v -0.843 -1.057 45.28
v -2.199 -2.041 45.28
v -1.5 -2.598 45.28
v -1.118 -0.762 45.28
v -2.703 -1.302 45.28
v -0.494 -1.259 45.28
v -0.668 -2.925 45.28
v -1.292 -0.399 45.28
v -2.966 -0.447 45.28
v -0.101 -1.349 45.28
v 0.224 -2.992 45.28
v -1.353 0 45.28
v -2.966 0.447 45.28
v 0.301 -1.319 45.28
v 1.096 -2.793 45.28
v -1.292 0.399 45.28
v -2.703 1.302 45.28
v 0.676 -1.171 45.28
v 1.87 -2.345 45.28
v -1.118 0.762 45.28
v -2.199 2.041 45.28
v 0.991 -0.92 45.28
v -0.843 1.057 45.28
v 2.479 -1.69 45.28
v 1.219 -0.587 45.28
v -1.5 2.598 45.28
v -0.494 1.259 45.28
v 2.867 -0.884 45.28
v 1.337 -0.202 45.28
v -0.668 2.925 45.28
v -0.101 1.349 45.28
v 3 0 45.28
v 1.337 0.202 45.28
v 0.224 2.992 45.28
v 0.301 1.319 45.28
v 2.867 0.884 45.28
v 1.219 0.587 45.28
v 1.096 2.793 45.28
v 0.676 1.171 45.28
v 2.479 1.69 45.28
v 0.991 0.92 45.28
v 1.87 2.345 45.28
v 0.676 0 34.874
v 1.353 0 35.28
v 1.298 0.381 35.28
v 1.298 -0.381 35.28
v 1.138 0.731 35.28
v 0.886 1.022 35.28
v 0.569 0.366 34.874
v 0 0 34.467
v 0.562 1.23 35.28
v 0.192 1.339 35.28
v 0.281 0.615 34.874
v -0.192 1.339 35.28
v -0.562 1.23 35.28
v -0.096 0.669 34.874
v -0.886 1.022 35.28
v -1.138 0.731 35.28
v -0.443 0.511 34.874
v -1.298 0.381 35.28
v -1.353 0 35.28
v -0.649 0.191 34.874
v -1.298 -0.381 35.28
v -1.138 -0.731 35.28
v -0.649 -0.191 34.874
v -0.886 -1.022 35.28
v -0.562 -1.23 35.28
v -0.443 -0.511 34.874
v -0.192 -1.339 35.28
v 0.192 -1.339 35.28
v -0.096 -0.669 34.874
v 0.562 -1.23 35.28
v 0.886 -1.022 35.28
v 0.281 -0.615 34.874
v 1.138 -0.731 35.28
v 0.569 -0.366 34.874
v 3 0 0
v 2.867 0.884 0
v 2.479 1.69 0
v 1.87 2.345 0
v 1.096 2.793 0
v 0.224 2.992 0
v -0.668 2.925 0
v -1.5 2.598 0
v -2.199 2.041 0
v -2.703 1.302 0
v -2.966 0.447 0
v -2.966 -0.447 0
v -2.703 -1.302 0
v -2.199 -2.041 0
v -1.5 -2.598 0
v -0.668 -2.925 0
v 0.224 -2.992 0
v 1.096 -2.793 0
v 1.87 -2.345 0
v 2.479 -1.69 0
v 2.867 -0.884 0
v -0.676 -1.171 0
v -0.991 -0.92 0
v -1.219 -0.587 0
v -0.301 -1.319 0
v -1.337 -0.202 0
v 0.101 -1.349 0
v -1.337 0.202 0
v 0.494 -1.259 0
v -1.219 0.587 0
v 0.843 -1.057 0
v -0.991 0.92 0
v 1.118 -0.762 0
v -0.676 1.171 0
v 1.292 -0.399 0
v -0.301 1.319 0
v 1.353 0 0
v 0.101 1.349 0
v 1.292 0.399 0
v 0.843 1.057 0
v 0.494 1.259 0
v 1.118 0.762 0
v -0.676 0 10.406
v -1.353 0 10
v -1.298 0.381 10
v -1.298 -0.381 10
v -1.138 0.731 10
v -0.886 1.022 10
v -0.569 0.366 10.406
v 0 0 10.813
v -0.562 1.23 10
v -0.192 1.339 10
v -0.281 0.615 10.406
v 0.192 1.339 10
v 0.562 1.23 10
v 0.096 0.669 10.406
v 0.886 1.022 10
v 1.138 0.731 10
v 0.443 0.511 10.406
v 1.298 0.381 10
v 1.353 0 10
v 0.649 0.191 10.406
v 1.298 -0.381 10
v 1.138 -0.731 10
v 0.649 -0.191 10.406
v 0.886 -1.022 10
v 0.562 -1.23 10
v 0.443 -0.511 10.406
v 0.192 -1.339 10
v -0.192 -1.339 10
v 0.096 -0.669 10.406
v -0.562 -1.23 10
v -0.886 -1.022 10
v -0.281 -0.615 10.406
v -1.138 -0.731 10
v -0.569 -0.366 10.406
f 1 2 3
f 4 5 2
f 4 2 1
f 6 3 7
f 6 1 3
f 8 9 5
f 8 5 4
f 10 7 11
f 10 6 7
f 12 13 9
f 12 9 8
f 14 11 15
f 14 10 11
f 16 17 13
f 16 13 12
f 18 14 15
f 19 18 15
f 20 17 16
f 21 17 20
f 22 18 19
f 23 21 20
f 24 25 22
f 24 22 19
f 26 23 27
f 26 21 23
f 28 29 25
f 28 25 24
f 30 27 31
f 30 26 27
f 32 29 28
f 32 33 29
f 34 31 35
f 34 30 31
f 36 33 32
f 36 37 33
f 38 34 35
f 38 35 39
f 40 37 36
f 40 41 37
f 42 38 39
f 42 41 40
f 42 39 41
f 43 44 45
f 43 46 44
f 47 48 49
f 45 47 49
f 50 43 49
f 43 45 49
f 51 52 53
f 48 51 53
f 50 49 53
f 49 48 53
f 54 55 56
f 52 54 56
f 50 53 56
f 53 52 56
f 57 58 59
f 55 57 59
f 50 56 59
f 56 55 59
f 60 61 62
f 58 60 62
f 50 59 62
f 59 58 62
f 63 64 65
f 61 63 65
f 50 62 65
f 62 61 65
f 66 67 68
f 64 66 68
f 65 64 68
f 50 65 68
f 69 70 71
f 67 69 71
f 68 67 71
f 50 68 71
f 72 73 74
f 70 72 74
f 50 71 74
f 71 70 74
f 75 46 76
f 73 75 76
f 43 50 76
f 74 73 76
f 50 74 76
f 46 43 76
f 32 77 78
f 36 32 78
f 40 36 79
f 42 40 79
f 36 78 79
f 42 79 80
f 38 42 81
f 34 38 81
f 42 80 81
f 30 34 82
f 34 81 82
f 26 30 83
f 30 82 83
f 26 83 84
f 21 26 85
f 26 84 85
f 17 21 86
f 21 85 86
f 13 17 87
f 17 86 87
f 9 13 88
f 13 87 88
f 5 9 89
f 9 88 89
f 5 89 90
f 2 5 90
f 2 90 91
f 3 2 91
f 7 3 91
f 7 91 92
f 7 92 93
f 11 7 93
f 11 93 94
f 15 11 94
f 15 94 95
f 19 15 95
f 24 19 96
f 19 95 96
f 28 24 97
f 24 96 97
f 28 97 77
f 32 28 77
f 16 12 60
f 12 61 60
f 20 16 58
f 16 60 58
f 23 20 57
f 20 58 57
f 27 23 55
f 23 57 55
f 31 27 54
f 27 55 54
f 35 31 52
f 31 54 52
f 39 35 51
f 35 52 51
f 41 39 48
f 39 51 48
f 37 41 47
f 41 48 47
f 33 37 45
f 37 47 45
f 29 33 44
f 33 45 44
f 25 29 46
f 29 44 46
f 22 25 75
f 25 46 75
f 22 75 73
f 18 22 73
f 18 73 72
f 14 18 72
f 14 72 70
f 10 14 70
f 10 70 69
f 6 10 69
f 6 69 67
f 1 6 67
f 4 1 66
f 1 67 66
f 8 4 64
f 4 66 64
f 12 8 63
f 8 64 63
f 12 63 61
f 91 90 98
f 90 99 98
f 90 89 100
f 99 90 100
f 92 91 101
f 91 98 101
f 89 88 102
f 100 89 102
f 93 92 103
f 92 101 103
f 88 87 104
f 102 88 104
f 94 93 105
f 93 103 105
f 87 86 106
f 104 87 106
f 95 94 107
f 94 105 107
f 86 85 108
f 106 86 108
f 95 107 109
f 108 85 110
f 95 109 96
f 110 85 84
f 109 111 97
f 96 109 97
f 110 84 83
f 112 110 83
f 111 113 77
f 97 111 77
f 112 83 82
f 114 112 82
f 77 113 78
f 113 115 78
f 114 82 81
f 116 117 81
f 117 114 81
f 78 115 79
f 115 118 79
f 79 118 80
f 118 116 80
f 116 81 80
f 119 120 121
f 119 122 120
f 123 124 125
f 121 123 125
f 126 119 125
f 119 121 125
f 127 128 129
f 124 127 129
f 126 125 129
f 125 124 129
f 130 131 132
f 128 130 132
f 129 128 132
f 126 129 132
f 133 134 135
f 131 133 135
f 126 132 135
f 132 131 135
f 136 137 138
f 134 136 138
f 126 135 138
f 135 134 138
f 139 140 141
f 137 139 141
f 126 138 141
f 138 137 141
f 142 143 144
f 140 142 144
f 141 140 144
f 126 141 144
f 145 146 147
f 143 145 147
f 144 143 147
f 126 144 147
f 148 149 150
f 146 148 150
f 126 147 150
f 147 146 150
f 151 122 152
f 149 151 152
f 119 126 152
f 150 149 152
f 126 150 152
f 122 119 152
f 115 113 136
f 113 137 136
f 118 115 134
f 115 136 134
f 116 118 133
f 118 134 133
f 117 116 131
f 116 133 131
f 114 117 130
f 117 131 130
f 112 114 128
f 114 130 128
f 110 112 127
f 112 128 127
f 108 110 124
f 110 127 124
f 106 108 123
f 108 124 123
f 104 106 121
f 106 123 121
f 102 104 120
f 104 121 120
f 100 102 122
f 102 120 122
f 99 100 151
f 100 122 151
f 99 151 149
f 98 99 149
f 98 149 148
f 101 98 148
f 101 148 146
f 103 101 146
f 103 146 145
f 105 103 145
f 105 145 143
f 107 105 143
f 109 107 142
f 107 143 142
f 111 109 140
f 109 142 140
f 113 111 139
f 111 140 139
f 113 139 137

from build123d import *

# Parameters (mm, degrees)
SKETCH1_R                 = 3
BOSS_EXTRUDE1_DEPTH       = 45.28
F_6_32_TAPPED_HOLE1_D     = 2.7051
F_6_32_TAPPED_HOLE1_DEPTH = 10
F_6_32_TAPPED_HOLE1_TIP   = 0.81269403
F_6_32_TAPPED_HOLE2_D     = 2.7051
F_6_32_TAPPED_HOLE2_DEPTH = 10
F_6_32_TAPPED_HOLE2_TIP   = 0.81269403


with BuildPart() as part:
    # Sketch1 → Boss-Extrude1 (new body)
    with BuildSketch(Plane.XY):
        Circle(SKETCH1_R)
    extrude(amount=BOSS_EXTRUDE1_DEPTH)

    # #6-32 Tapped Hole1
    with Locations(Plane.XY.offset(45.28)):
        with Locations((0, 0)):
            Hole(F_6_32_TAPPED_HOLE1_D / 2, depth=F_6_32_TAPPED_HOLE1_DEPTH)
            with Locations((0, 0, -(F_6_32_TAPPED_HOLE1_DEPTH + F_6_32_TAPPED_HOLE1_TIP / 2))):  # 118° drill point
                Cone(0, F_6_32_TAPPED_HOLE1_D / 2, F_6_32_TAPPED_HOLE1_TIP, mode=Mode.SUBTRACT)

    # #6-32 Tapped Hole2
    with Locations(Plane(origin=(0, 0, 0), x_dir=(-1, 0, 0), z_dir=(0, 0, -1))):
        with Locations((0, 0)):
            Hole(F_6_32_TAPPED_HOLE2_D / 2, depth=F_6_32_TAPPED_HOLE2_DEPTH)
            with Locations((0, 0, -(F_6_32_TAPPED_HOLE2_DEPTH + F_6_32_TAPPED_HOLE2_TIP / 2))):  # 118° drill point
                Cone(0, F_6_32_TAPPED_HOLE2_D / 2, F_6_32_TAPPED_HOLE2_TIP, mode=Mode.SUBTRACT)


solid = part.part
